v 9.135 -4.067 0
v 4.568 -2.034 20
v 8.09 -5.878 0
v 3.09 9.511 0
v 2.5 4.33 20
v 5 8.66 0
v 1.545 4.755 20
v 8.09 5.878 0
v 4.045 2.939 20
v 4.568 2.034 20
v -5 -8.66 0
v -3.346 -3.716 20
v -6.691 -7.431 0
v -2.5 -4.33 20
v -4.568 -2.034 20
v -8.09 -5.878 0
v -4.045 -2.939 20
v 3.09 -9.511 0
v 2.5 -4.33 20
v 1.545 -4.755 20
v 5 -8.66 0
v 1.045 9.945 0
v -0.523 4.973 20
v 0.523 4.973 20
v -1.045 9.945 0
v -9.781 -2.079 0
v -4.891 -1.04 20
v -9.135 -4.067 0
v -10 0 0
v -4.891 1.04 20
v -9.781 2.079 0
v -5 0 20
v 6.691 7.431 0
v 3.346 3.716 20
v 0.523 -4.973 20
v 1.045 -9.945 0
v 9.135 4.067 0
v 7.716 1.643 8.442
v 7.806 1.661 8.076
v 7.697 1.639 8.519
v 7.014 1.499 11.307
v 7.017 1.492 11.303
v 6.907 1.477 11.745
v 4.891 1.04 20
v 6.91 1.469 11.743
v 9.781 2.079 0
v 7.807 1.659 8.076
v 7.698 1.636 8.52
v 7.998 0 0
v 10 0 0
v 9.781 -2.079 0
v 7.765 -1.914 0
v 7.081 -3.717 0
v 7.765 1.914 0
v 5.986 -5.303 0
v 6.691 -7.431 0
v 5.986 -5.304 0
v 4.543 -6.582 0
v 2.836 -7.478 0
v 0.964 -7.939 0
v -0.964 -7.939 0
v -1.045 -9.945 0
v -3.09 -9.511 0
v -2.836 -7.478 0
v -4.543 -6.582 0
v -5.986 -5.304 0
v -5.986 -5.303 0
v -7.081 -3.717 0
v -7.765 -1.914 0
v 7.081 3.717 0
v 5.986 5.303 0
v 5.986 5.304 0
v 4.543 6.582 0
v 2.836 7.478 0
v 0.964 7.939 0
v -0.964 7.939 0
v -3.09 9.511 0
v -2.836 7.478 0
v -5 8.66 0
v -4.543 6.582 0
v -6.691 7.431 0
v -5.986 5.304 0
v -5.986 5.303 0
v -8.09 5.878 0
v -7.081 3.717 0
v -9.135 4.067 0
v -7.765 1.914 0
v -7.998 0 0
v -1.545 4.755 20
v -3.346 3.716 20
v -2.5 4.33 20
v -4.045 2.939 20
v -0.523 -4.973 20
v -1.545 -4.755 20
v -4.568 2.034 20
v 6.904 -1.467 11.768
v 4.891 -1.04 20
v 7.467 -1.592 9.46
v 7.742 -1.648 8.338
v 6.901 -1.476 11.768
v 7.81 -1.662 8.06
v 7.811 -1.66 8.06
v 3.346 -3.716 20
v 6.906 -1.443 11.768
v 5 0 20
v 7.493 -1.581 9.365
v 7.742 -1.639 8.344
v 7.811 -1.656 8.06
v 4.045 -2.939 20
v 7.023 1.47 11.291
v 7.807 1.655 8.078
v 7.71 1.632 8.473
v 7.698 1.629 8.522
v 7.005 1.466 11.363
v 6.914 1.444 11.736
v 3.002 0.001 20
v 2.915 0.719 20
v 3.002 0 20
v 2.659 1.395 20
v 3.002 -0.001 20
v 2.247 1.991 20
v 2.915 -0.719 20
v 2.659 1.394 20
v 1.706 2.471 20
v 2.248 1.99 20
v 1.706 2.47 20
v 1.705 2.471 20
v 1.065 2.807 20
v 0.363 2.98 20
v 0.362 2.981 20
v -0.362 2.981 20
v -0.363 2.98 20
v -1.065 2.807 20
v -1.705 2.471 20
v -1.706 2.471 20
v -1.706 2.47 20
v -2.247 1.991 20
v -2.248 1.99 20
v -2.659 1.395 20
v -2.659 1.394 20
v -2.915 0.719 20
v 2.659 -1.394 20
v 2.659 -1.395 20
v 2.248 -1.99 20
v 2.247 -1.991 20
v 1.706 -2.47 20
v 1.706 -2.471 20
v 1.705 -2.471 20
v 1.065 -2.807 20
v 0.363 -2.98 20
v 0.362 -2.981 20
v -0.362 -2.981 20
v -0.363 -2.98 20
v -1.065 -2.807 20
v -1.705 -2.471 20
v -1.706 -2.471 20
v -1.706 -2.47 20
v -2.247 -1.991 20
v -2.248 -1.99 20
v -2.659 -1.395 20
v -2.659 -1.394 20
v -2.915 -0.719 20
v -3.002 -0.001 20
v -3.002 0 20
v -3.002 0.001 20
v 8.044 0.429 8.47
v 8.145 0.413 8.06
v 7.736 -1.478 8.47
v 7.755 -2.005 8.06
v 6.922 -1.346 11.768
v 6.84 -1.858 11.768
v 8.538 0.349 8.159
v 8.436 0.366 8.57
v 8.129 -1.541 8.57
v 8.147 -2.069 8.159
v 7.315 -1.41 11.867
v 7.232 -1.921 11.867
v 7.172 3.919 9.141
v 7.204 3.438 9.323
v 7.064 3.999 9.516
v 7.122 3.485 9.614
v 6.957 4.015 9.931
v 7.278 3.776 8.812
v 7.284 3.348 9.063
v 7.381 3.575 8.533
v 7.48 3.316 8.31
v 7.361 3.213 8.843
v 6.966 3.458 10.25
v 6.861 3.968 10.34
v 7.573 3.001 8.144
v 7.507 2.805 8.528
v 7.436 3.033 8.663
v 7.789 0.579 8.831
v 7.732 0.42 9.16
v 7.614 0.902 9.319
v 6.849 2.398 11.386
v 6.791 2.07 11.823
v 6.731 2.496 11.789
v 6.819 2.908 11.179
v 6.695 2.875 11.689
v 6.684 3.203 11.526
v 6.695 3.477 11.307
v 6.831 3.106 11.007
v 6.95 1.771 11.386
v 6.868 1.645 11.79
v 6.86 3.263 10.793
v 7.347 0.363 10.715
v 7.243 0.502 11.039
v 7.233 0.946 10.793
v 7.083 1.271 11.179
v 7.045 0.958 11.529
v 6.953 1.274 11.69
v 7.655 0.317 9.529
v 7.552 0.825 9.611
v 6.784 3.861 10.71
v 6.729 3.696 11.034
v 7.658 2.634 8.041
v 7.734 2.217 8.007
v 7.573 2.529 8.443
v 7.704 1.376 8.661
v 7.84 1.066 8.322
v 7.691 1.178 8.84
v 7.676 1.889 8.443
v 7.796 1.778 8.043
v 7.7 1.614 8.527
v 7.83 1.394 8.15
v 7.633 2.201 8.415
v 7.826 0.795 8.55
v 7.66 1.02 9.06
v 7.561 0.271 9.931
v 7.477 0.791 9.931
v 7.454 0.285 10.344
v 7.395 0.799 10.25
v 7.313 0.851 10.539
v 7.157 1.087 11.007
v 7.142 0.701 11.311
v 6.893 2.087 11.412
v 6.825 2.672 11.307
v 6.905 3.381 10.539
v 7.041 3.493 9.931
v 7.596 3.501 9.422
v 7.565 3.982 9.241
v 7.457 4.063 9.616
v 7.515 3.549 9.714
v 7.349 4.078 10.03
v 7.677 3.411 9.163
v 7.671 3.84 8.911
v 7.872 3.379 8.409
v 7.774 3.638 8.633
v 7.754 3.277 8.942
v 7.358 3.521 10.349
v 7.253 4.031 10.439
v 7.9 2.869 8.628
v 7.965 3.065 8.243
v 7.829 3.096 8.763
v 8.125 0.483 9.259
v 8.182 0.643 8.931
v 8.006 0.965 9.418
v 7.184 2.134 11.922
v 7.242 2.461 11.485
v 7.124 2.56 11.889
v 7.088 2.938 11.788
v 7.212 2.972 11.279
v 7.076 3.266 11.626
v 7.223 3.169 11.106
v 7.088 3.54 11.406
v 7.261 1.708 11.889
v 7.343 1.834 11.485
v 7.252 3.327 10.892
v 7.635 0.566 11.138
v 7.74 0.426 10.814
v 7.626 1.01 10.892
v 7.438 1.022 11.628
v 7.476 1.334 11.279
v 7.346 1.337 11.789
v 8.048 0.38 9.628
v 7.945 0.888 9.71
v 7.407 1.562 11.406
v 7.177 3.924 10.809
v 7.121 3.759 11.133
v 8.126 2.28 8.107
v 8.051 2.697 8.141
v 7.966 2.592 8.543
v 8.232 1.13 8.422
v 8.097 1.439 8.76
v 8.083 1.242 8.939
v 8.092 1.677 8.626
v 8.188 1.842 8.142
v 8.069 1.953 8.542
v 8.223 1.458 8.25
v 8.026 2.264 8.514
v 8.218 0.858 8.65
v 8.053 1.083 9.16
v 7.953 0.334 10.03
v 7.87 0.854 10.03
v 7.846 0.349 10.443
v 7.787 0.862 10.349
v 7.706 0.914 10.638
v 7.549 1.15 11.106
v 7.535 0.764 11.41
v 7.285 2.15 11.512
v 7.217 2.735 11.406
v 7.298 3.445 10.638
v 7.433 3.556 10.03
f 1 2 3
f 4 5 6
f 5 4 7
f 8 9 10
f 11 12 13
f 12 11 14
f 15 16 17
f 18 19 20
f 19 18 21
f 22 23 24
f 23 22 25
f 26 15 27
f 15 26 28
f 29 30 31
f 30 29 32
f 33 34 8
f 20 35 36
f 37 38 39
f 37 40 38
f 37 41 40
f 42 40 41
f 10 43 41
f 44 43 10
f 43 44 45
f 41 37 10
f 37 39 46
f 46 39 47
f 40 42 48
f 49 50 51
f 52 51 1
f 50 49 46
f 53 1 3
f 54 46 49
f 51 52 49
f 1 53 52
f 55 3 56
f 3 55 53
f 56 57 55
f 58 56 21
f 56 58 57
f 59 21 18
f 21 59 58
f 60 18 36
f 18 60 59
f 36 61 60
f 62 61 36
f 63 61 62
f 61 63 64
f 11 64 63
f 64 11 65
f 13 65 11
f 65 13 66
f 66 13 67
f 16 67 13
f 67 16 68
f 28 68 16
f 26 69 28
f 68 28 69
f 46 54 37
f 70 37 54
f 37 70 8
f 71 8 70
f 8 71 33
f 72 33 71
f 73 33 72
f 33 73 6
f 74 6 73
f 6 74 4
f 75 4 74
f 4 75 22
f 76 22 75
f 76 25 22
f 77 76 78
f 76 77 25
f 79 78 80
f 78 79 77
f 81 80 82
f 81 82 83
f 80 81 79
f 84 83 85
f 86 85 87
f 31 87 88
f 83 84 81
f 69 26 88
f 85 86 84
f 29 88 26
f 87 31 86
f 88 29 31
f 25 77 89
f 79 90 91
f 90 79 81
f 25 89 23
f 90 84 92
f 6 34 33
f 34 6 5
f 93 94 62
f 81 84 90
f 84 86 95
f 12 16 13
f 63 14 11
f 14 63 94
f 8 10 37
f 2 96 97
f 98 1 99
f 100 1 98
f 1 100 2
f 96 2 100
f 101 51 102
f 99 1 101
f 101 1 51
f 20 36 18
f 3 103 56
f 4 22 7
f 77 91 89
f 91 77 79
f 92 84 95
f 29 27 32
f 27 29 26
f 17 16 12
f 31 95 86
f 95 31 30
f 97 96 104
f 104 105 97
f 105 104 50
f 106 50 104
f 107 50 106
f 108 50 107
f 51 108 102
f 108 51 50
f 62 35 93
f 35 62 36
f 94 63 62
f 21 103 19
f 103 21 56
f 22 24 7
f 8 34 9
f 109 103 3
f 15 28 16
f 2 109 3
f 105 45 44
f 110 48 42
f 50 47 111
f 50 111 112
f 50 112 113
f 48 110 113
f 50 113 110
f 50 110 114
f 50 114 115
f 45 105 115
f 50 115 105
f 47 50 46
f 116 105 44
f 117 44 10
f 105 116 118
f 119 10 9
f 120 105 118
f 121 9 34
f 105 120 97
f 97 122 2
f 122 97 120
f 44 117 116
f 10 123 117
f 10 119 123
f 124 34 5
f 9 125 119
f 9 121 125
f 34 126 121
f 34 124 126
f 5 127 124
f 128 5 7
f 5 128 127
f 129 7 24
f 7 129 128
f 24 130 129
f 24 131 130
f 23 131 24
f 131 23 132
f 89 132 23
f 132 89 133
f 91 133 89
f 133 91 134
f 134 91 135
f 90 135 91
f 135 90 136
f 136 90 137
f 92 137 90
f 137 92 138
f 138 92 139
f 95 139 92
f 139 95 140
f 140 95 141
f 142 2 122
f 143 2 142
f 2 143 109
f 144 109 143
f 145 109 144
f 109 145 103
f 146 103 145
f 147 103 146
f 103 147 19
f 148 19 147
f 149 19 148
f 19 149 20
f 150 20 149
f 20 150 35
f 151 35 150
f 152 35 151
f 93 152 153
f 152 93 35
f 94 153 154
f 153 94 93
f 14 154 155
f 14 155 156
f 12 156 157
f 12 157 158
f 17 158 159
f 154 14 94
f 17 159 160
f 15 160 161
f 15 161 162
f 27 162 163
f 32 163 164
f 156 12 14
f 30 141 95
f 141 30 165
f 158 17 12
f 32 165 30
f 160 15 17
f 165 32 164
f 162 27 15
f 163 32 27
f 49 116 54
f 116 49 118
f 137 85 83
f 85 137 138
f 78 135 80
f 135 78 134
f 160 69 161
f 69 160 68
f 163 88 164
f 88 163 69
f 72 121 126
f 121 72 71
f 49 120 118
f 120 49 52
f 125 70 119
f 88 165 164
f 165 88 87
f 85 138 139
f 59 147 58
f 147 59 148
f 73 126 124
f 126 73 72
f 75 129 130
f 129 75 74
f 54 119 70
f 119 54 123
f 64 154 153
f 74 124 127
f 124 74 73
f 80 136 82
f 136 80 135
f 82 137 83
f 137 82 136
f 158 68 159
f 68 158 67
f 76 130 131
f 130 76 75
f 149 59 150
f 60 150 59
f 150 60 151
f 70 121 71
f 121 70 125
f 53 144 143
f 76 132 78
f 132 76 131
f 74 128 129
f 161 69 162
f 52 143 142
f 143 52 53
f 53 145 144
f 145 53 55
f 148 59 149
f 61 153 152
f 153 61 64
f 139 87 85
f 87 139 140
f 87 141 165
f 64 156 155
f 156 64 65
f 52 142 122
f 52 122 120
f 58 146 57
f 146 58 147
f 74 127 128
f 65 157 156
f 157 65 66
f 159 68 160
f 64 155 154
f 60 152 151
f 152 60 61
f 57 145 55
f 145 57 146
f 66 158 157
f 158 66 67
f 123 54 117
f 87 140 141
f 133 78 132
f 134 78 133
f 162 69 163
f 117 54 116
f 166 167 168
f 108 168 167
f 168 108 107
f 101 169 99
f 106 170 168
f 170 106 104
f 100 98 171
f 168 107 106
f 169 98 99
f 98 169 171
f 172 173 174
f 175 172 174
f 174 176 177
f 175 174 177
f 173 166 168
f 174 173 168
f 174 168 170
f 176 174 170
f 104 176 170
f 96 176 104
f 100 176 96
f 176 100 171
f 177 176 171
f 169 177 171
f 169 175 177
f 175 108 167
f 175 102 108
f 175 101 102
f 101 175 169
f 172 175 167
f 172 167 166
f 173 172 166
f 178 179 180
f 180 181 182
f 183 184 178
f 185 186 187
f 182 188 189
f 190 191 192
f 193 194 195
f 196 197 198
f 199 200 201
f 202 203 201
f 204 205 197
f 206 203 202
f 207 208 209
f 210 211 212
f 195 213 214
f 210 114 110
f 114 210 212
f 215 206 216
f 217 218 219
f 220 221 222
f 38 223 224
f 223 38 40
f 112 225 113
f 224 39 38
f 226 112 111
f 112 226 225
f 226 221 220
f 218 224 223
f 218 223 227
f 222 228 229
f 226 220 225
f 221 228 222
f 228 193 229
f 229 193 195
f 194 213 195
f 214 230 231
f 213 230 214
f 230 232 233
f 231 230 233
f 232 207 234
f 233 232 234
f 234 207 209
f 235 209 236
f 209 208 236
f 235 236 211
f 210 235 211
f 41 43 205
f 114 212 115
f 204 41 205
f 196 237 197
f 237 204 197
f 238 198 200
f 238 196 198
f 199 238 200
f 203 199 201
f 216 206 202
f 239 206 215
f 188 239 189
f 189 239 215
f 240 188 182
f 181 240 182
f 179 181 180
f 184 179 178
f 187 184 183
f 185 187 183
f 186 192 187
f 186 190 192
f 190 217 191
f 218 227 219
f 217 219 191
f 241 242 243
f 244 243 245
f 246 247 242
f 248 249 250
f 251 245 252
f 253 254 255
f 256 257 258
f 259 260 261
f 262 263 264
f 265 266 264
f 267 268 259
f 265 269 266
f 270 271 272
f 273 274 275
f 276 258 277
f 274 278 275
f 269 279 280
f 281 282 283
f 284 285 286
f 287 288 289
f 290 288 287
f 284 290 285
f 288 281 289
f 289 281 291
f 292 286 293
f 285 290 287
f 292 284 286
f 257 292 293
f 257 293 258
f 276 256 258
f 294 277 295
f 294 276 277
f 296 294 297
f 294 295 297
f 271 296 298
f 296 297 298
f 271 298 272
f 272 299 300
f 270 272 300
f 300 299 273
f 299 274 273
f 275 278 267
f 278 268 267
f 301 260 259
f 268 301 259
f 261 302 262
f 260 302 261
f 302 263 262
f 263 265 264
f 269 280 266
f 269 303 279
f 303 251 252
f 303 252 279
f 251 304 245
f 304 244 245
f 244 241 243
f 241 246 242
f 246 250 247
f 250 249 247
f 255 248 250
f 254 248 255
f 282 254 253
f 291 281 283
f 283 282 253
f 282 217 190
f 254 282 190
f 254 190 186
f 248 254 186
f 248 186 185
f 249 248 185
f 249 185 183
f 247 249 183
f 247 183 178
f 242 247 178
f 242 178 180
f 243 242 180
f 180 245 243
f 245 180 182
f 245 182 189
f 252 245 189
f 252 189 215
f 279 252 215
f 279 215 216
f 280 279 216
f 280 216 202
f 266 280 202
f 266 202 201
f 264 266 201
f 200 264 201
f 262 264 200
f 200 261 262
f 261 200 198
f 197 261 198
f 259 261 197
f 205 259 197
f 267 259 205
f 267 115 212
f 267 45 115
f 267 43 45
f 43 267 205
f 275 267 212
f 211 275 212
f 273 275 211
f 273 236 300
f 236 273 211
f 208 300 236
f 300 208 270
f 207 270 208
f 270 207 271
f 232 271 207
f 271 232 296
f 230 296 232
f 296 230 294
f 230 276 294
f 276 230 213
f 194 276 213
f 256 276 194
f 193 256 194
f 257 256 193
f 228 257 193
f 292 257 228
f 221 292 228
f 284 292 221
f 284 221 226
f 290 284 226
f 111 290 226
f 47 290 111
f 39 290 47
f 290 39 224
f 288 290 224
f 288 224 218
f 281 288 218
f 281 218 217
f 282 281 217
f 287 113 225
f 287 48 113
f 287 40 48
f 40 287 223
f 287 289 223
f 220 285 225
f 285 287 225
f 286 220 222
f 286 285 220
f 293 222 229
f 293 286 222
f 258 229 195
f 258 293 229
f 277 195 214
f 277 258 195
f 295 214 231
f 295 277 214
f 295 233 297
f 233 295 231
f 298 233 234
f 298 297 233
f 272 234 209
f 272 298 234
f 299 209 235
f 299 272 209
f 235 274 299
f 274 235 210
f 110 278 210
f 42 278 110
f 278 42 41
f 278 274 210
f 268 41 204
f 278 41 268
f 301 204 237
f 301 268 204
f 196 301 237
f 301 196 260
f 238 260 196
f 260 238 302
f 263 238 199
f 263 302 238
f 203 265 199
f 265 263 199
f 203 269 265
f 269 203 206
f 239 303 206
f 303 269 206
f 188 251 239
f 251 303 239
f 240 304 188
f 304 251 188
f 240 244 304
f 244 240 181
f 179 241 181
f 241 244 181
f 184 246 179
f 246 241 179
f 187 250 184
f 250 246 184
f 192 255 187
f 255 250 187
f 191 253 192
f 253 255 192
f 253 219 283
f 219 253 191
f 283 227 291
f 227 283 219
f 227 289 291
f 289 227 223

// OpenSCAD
// Generated by scadwright. Do not hand-edit —
// edit the Python source and regenerate.

union() {
    // Funnel
    //  bot_od = 20  (input)
    //  h      = 20  (input)
    //  thk    = 2  (input)
    //  top_od = 10  (input)
    difference() {
        cylinder(h=20, r1=10, r2=5, center=false);
        translate([0, 0, -0.01]) {
            scale([1, 1, 1.001]) {
                cylinder(h=20, r1=8, r2=3, center=false);
            }
        }
    }

    translate([7.39433, -1.19329, 10]) {
        multmatrix([[0.159318, -0.239438, 0.957751, 0], [0.987227, 0.0386403, -0.154561, 0], [0, 0.970143, 0.242536, 0], [0, 0, 0, 1]]) {
            linear_extrude(height=0.41, center=false) {
                translate([-1.2, -2, 0]) {
                    text("L", size=4);
                }
            }
        }
    }

    translate([7.39433, 1.19329, 10]) {
        multmatrix([[-0.159318, -0.239438, 0.957751, 0], [0.987227, -0.0386403, 0.154561, 0], [0, 0.970143, 0.242536, 0], [0, 0, 0, 1]]) {
            linear_extrude(height=0.41, center=false) {
                translate([-1.2, -2, 0]) {
                    text("O", size=4);
                }
            }
        }
    }
}
